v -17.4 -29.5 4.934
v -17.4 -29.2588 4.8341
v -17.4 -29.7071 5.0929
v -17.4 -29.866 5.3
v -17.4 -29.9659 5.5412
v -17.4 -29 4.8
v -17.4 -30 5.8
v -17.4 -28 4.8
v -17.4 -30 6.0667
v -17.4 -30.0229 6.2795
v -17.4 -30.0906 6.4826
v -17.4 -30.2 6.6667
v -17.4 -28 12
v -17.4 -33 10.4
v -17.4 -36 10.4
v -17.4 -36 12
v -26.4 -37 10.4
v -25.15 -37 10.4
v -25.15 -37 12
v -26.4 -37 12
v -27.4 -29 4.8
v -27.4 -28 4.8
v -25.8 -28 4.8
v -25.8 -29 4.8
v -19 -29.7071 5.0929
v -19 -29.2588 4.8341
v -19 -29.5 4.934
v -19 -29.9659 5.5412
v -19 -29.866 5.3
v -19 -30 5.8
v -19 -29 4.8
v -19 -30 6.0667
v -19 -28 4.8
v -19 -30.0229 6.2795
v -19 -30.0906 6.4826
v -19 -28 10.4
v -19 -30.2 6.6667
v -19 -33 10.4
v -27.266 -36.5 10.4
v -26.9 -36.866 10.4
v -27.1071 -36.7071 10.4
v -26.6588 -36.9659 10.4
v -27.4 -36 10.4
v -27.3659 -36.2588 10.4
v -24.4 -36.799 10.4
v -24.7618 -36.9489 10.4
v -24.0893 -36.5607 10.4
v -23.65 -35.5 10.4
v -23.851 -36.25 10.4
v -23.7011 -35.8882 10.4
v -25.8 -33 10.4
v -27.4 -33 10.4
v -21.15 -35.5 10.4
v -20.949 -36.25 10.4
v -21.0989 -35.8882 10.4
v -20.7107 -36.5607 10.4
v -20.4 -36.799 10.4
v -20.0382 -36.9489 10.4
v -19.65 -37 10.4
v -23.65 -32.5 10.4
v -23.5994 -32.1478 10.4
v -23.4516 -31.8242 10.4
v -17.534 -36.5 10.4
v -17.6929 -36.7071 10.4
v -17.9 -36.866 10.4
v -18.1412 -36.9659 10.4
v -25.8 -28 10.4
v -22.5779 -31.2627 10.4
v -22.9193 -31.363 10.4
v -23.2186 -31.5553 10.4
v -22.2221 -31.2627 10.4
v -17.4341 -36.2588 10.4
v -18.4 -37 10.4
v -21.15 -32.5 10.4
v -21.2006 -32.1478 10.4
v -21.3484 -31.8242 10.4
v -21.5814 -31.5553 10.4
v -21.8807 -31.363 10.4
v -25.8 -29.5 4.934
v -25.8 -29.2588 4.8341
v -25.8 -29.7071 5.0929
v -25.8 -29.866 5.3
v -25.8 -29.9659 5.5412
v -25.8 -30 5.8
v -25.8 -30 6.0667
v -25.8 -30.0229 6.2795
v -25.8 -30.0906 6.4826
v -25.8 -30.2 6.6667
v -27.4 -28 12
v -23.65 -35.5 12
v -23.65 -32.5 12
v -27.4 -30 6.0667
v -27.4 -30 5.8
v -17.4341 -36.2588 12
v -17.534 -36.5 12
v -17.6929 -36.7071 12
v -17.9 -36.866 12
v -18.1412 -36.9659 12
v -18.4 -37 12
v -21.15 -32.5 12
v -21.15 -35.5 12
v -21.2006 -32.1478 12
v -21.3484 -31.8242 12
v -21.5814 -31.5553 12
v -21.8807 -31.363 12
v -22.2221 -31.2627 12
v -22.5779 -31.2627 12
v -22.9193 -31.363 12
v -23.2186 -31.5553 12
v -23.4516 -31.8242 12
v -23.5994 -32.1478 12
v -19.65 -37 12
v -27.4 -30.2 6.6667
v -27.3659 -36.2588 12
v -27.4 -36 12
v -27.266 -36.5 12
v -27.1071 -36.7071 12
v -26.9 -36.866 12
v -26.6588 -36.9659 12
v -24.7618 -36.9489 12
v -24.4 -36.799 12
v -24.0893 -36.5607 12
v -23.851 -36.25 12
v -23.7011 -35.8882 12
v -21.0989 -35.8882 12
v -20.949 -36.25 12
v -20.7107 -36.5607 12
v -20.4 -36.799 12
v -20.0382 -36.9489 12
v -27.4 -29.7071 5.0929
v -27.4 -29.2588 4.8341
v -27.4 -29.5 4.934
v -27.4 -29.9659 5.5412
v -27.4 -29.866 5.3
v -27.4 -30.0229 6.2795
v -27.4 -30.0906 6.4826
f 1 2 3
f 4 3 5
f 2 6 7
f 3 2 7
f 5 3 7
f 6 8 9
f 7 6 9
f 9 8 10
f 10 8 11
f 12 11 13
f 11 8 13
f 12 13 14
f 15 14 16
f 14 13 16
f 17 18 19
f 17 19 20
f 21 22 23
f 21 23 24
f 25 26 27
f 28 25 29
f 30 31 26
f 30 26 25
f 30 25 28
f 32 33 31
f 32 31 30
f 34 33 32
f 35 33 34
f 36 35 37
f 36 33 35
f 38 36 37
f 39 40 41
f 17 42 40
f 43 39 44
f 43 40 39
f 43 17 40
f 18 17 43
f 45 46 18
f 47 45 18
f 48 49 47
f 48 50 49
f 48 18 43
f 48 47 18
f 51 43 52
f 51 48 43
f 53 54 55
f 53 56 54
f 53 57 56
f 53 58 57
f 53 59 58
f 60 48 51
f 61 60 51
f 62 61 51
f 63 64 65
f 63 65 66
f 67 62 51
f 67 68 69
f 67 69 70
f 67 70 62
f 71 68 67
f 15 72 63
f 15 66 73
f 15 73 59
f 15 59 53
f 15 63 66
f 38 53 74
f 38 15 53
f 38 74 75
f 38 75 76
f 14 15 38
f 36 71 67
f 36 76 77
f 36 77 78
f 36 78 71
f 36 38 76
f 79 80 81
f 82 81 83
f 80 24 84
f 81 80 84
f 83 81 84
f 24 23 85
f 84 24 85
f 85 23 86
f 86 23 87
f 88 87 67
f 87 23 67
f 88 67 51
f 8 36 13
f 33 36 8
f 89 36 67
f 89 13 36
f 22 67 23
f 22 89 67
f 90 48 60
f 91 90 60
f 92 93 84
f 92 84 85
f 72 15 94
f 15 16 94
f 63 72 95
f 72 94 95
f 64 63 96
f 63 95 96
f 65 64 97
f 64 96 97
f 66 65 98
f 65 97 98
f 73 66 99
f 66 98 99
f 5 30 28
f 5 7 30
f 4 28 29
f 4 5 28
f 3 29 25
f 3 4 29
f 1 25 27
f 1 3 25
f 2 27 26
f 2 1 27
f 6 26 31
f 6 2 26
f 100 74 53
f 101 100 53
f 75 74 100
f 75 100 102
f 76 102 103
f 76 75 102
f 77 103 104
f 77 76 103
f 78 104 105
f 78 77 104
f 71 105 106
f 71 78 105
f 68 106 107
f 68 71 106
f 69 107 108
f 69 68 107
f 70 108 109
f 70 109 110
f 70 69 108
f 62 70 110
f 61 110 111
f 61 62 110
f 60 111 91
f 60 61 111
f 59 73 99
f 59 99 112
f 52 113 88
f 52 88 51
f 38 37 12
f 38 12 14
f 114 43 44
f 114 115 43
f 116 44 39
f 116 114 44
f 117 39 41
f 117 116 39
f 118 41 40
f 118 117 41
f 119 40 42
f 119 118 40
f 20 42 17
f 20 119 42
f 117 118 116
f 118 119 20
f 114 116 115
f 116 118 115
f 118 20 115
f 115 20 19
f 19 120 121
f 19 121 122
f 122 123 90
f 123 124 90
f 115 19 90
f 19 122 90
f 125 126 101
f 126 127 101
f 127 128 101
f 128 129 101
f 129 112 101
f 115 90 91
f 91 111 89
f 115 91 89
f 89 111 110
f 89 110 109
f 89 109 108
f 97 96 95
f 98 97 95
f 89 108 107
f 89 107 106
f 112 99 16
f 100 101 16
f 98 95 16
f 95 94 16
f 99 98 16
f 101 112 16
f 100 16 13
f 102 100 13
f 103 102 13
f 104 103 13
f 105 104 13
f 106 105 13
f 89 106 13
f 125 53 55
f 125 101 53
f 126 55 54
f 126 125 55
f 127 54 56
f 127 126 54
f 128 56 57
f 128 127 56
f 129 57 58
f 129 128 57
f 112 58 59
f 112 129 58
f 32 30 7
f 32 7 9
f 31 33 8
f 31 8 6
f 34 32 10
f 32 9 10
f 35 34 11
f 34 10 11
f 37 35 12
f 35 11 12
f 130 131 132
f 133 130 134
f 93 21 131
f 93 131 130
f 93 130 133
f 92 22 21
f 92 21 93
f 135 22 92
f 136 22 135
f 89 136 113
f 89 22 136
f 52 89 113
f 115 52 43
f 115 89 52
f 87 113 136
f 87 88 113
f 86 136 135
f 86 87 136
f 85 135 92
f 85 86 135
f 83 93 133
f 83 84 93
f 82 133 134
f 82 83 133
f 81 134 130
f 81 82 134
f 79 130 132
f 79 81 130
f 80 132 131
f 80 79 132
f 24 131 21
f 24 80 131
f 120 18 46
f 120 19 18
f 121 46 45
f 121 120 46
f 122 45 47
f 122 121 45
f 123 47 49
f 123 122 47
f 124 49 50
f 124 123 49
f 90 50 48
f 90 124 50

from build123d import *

# Parameters (mm, degrees)
PAD008_DEPTH            = 1.6
PAD009_DEPTH            = 1.6
LINEARPATTERN003_COUNT  = 2
LINEARPATTERN003_PITCH  = 8.4
FILLET012_R             = 1
FILLET013_R             = 1
FILLET014_R             = 1
FILLET015_R             = 1.5
BODY004_PLACEMENT_ANGLE = 90


with BuildPart() as part:
    # Sketch010 → Pad008 (new body)
    with BuildSketch(Plane.XY):
        with BuildLine():
            Line((-4.5, 5), (4.5, 5))
            Line((4.5, 5), (4.5, 1.25))
            Line((0, 1.25), (4.5, 1.25))
            ThreePointArc((0, 1.25), (-1.25, 0), (0, -1.25))
            Line((4.5, -1.25), (0, -1.25))
            Line((4.5, -1.25), (4.5, -5))
            Line((4.5, -5), (-4.5, -5))
            Line((-4.5, -5), (-4.5, 5))
        make_face()
    extrude(amount=PAD008_DEPTH)

    # Sketch011 (on DatumPlane) → Pad009 (join)
    with BuildSketch(Plane.XZ.offset(5)):
        Polygon((-4.5, 0), (-4.5, -5.6), (-2.5, -5.6), (-2.5, -4), (0.5, 0), align=None)
    pad009 = extrude(amount=-PAD009_DEPTH)

    # LinearPattern003: Pad009 ×2
    with Locations(*[(0, i * LINEARPATTERN003_PITCH, 0) for i in range(1, LINEARPATTERN003_COUNT)]):
        add(pad009)

    # Fillet012
    fillet012_edges = [part.edges().sort_by_distance(p)[0] for p in [
        (-2.5, -4.2, -5.6),
        (-2.5, 4.2, -5.6),
    ]]
    fillet(fillet012_edges, radius=FILLET012_R)

    # Fillet013
    fillet013_edges = [part.edges().sort_by_distance(p)[0] for p in [
        (-2.5, -4.2, -4),
        (-2.5, 4.2, -4),
    ]]
    fillet(fillet013_edges, radius=FILLET013_R)

    # Fillet014
    fillet014_edges = [part.edges().sort_by_distance(p)[0] for p in [
        (4.5, -5, 0.8),
        (4.5, 5, 0.8),
    ]]
    fillet(fillet014_edges, radius=FILLET014_R)

    # Fillet015
    fillet015_edges = [part.edges().sort_by_distance(p)[0] for p in [
        (4.5, -1.25, 0.8),
        (4.5, 1.25, 0.8),
    ]]
    fillet(fillet015_edges, radius=FILLET015_R)


with BuildPart() as part_1:
    # Body004 placement: moved
    add(part.part.moved(Location((-22.4, -32.5, 10.4))).rotate(Axis((-22.4, -32.5, 10.4), (0, 0, -1)), BODY004_PLACEMENT_ANGLE))


solid = part_1.part
